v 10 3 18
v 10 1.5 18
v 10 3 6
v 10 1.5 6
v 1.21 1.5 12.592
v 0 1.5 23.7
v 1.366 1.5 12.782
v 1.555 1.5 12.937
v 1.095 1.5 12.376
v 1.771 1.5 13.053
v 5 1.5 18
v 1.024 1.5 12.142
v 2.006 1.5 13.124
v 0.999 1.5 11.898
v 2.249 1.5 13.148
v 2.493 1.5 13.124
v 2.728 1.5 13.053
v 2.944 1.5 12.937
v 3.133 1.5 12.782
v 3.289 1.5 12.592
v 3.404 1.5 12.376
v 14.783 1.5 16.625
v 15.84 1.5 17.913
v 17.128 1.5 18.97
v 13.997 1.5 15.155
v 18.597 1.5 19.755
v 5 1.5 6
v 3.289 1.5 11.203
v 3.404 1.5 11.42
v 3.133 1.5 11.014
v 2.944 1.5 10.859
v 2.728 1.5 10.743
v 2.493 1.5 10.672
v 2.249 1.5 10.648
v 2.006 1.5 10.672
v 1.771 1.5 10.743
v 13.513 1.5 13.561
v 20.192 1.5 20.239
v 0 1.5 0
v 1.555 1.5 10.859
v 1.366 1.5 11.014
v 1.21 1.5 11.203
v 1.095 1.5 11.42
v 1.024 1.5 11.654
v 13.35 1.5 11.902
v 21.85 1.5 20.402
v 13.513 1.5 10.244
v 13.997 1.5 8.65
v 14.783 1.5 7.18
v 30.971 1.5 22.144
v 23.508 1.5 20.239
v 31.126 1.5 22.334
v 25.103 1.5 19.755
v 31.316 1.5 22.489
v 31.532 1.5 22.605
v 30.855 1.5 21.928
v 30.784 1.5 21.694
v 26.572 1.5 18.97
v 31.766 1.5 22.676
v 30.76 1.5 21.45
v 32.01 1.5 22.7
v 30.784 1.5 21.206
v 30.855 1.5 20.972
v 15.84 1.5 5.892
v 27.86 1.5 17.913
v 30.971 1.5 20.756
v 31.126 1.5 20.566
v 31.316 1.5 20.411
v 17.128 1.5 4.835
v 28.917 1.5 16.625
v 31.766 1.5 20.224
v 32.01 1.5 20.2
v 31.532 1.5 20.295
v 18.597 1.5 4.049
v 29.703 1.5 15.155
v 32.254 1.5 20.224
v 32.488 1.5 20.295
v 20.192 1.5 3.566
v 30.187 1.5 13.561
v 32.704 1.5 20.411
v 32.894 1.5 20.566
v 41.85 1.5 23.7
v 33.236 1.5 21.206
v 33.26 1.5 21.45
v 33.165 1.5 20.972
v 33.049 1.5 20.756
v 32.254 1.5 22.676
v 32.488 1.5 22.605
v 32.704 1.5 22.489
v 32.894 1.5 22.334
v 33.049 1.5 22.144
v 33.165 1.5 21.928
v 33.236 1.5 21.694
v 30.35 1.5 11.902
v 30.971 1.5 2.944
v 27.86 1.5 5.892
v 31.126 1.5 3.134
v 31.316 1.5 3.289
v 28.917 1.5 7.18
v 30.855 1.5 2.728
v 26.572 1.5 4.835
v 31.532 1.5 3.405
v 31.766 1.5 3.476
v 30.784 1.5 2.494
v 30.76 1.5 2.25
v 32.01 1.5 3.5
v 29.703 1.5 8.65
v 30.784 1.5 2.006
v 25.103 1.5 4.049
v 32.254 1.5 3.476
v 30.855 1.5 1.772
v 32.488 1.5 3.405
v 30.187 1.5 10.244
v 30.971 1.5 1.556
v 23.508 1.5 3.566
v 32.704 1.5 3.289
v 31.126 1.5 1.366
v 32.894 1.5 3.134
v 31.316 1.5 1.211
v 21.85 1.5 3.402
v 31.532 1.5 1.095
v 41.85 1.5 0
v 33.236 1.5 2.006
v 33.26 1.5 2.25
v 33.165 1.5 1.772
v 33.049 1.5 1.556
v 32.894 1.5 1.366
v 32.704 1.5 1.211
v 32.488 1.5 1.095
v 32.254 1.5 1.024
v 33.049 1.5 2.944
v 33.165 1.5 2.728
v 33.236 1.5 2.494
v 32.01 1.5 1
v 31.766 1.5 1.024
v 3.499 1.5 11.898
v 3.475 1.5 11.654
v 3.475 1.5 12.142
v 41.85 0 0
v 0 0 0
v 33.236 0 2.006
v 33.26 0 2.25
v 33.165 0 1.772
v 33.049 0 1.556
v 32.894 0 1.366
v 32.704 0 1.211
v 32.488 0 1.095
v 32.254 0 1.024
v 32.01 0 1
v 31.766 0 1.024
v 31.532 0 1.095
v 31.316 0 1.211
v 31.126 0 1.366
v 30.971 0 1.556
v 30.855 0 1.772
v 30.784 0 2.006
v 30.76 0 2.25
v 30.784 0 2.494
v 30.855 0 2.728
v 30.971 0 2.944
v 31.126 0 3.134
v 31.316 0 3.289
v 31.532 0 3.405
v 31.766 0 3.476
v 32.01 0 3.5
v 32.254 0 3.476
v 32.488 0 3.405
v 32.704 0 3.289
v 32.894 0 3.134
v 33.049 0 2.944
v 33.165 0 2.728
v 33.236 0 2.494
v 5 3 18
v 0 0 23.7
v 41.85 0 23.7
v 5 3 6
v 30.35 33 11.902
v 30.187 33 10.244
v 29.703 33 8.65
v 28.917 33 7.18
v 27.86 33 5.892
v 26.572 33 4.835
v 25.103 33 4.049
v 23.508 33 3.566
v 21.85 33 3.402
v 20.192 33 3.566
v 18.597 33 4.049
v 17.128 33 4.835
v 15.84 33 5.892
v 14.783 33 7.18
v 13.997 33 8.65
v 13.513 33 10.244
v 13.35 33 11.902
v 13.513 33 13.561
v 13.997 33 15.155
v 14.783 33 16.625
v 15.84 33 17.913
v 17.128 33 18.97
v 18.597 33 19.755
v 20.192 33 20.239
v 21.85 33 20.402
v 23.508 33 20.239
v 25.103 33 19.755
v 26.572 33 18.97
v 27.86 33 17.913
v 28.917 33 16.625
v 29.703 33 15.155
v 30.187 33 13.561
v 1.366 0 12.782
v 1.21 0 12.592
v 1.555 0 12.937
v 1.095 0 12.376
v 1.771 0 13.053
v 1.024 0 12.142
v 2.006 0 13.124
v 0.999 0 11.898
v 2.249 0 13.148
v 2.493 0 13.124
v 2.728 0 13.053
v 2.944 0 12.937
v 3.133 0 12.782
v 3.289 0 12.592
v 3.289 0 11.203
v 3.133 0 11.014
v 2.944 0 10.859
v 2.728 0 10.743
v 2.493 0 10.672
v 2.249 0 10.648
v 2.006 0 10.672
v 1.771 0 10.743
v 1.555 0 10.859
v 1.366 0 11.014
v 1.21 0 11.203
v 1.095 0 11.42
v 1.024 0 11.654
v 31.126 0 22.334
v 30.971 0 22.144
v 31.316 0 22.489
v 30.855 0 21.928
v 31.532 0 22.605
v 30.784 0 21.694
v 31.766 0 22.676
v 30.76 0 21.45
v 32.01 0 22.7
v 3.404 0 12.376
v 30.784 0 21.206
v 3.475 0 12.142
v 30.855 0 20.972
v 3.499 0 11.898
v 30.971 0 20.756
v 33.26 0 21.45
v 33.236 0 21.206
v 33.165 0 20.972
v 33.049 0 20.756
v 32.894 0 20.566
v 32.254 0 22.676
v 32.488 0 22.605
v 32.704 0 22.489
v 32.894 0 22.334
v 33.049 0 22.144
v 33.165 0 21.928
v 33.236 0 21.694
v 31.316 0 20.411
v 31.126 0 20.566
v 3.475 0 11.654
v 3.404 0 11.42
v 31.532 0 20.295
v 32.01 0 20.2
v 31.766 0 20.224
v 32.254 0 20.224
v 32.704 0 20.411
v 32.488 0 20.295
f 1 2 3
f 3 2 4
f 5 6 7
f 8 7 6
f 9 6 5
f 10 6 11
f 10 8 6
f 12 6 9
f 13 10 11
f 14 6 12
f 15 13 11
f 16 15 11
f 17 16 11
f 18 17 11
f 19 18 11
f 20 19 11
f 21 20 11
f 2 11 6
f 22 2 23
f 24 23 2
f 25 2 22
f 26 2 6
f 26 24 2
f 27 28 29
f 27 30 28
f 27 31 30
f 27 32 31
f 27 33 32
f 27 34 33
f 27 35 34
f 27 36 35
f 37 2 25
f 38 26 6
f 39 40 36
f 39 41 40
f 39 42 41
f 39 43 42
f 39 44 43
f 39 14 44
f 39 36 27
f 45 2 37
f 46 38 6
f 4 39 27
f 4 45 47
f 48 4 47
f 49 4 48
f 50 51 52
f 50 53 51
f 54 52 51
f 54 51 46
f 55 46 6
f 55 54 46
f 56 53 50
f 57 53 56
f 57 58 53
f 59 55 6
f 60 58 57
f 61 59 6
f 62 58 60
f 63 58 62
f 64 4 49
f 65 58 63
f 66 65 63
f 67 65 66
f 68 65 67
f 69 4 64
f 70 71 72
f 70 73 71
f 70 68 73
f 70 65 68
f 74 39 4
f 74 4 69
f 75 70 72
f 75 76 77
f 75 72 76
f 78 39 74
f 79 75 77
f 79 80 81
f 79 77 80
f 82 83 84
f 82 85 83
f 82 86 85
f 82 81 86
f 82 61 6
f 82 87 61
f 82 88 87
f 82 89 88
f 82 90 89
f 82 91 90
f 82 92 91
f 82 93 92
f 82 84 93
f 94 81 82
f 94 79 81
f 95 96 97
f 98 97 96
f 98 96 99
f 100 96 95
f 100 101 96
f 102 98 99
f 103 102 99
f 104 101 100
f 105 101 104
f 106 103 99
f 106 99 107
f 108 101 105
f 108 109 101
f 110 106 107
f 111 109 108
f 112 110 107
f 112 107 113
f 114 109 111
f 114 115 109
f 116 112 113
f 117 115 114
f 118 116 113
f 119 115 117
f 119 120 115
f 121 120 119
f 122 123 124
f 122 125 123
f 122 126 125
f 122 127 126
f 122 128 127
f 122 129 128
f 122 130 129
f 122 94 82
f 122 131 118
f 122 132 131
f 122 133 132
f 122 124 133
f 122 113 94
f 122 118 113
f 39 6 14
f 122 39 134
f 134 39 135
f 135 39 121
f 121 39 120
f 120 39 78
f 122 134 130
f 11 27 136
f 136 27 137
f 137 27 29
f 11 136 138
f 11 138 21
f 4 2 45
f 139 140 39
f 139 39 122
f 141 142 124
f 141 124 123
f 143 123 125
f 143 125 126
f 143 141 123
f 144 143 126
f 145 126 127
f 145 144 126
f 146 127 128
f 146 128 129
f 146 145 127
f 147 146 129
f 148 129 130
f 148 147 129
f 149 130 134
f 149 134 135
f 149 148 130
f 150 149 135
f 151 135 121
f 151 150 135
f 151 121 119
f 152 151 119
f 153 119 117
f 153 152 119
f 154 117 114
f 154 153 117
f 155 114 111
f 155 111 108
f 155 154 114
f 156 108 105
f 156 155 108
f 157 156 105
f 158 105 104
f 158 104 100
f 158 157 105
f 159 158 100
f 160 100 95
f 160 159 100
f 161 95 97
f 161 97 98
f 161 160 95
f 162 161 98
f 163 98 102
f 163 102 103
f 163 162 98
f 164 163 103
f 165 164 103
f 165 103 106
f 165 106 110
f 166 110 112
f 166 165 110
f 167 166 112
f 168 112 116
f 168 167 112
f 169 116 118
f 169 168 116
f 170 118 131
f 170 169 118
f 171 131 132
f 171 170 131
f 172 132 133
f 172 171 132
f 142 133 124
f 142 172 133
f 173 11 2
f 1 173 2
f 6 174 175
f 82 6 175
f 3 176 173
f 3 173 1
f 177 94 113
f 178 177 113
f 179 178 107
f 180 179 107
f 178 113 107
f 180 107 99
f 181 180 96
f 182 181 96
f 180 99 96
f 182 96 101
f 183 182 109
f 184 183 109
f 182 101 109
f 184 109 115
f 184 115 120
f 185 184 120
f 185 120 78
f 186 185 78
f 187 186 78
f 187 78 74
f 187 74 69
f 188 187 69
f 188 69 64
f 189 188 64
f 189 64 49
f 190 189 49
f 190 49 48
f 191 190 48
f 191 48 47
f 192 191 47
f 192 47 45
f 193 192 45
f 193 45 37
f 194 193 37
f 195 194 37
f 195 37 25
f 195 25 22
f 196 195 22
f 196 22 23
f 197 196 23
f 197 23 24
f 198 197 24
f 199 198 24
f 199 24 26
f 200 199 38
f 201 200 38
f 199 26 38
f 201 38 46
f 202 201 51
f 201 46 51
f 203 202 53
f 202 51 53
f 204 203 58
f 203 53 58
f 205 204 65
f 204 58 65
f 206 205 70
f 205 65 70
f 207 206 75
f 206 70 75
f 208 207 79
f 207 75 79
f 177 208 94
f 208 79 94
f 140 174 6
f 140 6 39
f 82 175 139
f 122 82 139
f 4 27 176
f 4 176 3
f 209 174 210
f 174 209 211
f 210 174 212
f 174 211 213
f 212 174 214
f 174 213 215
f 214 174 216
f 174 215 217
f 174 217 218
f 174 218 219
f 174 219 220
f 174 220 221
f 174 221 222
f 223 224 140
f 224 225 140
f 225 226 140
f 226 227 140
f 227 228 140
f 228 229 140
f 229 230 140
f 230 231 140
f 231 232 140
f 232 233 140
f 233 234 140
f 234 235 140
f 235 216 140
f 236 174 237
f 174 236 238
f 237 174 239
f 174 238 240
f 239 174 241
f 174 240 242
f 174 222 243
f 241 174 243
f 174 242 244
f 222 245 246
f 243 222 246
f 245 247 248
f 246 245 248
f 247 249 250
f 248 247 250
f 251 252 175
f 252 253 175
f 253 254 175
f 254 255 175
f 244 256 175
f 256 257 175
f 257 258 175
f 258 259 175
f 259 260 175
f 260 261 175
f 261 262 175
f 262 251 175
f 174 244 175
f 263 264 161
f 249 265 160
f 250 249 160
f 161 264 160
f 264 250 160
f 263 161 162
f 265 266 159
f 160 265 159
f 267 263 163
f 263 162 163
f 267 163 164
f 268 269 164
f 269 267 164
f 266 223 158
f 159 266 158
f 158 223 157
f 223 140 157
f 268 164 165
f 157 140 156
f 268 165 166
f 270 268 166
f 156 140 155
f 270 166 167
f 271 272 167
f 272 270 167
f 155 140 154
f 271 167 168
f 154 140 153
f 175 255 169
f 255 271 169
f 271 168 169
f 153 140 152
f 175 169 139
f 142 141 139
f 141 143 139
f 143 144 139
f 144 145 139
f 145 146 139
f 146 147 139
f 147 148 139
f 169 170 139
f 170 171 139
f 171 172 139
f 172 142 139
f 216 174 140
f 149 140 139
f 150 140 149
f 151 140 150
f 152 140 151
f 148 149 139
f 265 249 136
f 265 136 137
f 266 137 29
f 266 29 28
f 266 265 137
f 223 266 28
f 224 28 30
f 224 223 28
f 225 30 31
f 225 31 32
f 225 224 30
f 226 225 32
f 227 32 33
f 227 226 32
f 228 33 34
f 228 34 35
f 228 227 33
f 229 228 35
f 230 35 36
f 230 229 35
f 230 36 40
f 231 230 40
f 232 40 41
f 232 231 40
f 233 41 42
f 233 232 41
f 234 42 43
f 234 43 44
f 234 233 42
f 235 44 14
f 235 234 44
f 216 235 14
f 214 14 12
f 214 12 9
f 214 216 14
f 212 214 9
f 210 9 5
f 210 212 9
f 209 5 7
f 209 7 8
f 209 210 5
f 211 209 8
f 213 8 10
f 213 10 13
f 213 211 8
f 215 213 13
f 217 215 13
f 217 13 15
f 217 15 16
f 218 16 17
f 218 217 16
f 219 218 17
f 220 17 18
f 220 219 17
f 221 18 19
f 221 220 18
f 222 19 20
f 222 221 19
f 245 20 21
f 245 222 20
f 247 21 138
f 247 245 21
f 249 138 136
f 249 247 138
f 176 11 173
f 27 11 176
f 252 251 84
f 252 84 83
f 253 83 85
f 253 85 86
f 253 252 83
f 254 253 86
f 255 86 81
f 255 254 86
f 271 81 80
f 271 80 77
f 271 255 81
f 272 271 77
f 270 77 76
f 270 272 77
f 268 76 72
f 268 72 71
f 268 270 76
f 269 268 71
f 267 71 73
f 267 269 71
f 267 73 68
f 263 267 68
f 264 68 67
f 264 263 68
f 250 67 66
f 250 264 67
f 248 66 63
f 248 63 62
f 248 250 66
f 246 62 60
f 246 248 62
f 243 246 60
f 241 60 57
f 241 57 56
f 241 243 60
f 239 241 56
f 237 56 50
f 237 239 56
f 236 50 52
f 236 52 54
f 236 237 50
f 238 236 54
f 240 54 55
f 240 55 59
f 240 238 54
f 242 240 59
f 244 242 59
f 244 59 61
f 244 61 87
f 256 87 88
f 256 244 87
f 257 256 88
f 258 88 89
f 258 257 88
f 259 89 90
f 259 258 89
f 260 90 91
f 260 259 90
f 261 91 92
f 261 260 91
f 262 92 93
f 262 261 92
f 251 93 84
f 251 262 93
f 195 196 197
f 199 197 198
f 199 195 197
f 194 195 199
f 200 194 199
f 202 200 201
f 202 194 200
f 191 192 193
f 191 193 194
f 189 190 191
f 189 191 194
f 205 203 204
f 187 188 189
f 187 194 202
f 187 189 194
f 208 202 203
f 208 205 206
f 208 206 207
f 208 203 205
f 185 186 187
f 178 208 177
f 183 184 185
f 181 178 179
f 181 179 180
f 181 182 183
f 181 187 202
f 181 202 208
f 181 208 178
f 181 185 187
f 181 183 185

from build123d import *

# Parameters (mm, degrees)
SKETCH2_W           = 41.85
SKETCH2_H           = 23.7
SKETCH2_R           = 1.25
SKETCH2_R_2         = 8.5
BOSS_EXTRUDE1_DEPTH = 1.5
SKETCH2_3_R         = 8.5
BOSS_EXTRUDE2_DEPTH = 33
SKETCH2_6_W         = 5
SKETCH2_6_H         = 12
BOSS_EXTRUDE3_DEPTH = 3


with BuildPart() as part:
    # Sketch2 → Boss-Extrude1 (new body)
    with BuildSketch(Plane(origin=(0, 0, 0), x_dir=(1, 0, 0), z_dir=(0, 1, 0))):
        with Locations((20.925, -11.85)):
            Rectangle(SKETCH2_W, SKETCH2_H)
        with Locations((32.01, -2.25)):
            Circle(SKETCH2_R, mode=Mode.SUBTRACT)
        with Locations((21.85, -11.902335017)):
            Circle(SKETCH2_R_2, mode=Mode.SUBTRACT)
        with Locations((32.01, -21.45)):
            Circle(SKETCH2_R, mode=Mode.SUBTRACT)
        with Locations((2.249488742, -11.897962459)):
            Circle(SKETCH2_R, mode=Mode.SUBTRACT)
    extrude(amount=BOSS_EXTRUDE1_DEPTH)

    # Sketch2<3> → Boss-Extrude2 (add)
    with BuildSketch(Plane(origin=(0, 0, 0), x_dir=(1, 0, 0), z_dir=(0, 1, 0))):
        with Locations((21.85, -11.902335017)):
            Circle(SKETCH2_3_R)
    extrude(amount=BOSS_EXTRUDE2_DEPTH)

    # Sketch2<6> → Boss-Extrude3 (add)
    with BuildSketch(Plane(origin=(0, 0, 0), x_dir=(1, 0, 0), z_dir=(0, 1, 0))):
        with Locations((7.5, -12)):
            Rectangle(SKETCH2_6_W, SKETCH2_6_H)
    extrude(amount=BOSS_EXTRUDE3_DEPTH)


solid = part.part
